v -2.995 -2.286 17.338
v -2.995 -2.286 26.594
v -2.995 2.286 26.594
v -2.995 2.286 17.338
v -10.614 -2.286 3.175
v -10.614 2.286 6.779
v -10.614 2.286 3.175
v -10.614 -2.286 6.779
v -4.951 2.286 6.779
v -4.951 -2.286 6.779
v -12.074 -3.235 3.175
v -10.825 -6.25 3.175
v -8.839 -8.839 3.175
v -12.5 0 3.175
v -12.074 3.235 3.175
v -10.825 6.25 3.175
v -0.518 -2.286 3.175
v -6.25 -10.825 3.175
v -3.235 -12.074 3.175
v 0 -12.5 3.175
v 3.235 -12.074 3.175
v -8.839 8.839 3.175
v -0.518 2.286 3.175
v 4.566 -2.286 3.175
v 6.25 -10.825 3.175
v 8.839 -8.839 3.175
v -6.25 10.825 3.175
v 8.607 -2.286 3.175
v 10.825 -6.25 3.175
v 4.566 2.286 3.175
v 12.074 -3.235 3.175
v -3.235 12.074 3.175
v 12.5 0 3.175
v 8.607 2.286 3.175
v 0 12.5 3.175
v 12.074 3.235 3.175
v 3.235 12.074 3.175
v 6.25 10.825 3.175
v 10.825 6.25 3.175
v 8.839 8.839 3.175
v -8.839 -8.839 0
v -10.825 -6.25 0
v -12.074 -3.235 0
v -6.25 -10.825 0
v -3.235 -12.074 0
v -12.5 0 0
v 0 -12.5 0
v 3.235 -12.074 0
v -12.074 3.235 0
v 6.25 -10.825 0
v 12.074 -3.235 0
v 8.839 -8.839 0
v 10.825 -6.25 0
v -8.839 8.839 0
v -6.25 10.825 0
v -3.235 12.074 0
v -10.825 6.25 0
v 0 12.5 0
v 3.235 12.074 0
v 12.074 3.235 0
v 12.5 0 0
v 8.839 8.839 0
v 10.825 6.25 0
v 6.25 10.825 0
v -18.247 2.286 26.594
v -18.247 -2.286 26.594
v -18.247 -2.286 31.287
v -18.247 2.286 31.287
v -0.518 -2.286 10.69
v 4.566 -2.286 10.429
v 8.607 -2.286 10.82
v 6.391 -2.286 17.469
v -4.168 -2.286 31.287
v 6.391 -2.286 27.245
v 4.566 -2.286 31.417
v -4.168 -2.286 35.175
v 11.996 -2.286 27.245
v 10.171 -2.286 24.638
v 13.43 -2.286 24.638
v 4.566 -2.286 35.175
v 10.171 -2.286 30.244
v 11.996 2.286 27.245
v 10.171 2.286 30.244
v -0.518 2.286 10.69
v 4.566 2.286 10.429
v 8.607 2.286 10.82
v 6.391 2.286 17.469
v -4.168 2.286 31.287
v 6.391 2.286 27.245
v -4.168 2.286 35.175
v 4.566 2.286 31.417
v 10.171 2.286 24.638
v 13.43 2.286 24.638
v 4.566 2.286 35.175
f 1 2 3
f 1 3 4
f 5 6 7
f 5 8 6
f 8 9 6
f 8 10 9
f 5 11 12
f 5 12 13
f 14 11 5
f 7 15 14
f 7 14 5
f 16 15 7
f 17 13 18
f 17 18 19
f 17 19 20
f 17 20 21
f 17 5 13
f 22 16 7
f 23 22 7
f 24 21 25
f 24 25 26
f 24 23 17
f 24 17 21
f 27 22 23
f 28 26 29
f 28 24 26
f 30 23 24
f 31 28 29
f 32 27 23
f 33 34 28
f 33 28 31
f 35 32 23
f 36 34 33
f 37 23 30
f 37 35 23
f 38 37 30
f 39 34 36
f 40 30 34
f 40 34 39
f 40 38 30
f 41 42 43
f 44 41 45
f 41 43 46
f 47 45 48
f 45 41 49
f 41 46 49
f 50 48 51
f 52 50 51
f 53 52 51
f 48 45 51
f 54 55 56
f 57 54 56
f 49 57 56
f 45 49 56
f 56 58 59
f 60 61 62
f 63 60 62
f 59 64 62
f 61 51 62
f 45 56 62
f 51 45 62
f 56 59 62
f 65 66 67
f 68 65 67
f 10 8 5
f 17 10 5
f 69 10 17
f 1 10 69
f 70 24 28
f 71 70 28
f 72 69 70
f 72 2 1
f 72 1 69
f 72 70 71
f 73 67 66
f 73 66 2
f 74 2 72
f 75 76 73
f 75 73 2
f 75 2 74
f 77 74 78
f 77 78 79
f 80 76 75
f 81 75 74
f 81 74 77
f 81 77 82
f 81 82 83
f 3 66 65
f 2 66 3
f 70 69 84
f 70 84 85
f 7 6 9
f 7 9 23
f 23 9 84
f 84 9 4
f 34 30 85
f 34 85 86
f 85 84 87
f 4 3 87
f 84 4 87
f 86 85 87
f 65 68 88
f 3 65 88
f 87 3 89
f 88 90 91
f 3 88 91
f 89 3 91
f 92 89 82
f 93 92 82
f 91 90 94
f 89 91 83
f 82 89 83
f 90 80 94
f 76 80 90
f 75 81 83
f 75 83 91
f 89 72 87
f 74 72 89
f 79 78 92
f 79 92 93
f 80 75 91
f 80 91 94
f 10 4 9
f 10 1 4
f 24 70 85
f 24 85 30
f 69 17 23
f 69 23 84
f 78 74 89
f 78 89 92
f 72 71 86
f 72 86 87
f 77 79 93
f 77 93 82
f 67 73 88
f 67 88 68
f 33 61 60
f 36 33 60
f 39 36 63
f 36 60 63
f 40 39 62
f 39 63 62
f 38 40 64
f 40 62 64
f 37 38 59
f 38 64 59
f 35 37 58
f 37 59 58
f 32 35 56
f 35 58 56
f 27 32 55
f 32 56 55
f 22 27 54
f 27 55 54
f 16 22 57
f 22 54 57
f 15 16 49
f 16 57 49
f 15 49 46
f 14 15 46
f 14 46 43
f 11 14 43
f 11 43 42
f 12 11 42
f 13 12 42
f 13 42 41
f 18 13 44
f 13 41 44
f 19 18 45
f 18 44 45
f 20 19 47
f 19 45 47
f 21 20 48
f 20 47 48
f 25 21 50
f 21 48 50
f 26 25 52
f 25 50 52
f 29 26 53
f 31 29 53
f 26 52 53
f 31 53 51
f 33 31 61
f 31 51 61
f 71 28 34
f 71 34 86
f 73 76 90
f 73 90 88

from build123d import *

# Parameters (mm, degrees)
F0_R     = 12.5
F1_DEPTH = 3.175
F2_W     = 7.63344
F2_H     = 4.692908
F3_DEPTH = 2.286


with BuildPart() as f1:
    # F0 (on Top) → F1 (new body)
    with BuildSketch(Plane.XY):
        Circle(F0_R)
    extrude(amount=F1_DEPTH)

    # F2 (on Front) → F3 (join, symmetric)
    with BuildSketch(Plane.XZ):
        Polygon((-10.613647, 6.779125), (-10.613647, 3.175), (-0.518322, 3.175), (-0.518322, 10.689883), (4.565662, 10.429165), (4.565662, 3.175), (8.606777, 3.175), (8.606777, 10.820241), (6.390681, 17.468527), (6.390681, 27.245419), (10.171079, 24.638249), (13.430044, 24.638249), (11.9961, 27.245419), (10.171079, 30.243667), (4.565662, 31.416893), (4.565662, 35.175), (-4.168362, 35.175), (-4.168362, 31.286534), (-10.613647, 31.286534), (-10.613647, 26.593626), (-2.995135, 26.593626), (-2.995135, 17.33817), (-4.950513, 6.779125), align=None)
        with Locations((-14.430367, 28.94008)):
            Rectangle(F2_W, F2_H)
    extrude(amount=F3_DEPTH, both=True)


solid = f1.part
